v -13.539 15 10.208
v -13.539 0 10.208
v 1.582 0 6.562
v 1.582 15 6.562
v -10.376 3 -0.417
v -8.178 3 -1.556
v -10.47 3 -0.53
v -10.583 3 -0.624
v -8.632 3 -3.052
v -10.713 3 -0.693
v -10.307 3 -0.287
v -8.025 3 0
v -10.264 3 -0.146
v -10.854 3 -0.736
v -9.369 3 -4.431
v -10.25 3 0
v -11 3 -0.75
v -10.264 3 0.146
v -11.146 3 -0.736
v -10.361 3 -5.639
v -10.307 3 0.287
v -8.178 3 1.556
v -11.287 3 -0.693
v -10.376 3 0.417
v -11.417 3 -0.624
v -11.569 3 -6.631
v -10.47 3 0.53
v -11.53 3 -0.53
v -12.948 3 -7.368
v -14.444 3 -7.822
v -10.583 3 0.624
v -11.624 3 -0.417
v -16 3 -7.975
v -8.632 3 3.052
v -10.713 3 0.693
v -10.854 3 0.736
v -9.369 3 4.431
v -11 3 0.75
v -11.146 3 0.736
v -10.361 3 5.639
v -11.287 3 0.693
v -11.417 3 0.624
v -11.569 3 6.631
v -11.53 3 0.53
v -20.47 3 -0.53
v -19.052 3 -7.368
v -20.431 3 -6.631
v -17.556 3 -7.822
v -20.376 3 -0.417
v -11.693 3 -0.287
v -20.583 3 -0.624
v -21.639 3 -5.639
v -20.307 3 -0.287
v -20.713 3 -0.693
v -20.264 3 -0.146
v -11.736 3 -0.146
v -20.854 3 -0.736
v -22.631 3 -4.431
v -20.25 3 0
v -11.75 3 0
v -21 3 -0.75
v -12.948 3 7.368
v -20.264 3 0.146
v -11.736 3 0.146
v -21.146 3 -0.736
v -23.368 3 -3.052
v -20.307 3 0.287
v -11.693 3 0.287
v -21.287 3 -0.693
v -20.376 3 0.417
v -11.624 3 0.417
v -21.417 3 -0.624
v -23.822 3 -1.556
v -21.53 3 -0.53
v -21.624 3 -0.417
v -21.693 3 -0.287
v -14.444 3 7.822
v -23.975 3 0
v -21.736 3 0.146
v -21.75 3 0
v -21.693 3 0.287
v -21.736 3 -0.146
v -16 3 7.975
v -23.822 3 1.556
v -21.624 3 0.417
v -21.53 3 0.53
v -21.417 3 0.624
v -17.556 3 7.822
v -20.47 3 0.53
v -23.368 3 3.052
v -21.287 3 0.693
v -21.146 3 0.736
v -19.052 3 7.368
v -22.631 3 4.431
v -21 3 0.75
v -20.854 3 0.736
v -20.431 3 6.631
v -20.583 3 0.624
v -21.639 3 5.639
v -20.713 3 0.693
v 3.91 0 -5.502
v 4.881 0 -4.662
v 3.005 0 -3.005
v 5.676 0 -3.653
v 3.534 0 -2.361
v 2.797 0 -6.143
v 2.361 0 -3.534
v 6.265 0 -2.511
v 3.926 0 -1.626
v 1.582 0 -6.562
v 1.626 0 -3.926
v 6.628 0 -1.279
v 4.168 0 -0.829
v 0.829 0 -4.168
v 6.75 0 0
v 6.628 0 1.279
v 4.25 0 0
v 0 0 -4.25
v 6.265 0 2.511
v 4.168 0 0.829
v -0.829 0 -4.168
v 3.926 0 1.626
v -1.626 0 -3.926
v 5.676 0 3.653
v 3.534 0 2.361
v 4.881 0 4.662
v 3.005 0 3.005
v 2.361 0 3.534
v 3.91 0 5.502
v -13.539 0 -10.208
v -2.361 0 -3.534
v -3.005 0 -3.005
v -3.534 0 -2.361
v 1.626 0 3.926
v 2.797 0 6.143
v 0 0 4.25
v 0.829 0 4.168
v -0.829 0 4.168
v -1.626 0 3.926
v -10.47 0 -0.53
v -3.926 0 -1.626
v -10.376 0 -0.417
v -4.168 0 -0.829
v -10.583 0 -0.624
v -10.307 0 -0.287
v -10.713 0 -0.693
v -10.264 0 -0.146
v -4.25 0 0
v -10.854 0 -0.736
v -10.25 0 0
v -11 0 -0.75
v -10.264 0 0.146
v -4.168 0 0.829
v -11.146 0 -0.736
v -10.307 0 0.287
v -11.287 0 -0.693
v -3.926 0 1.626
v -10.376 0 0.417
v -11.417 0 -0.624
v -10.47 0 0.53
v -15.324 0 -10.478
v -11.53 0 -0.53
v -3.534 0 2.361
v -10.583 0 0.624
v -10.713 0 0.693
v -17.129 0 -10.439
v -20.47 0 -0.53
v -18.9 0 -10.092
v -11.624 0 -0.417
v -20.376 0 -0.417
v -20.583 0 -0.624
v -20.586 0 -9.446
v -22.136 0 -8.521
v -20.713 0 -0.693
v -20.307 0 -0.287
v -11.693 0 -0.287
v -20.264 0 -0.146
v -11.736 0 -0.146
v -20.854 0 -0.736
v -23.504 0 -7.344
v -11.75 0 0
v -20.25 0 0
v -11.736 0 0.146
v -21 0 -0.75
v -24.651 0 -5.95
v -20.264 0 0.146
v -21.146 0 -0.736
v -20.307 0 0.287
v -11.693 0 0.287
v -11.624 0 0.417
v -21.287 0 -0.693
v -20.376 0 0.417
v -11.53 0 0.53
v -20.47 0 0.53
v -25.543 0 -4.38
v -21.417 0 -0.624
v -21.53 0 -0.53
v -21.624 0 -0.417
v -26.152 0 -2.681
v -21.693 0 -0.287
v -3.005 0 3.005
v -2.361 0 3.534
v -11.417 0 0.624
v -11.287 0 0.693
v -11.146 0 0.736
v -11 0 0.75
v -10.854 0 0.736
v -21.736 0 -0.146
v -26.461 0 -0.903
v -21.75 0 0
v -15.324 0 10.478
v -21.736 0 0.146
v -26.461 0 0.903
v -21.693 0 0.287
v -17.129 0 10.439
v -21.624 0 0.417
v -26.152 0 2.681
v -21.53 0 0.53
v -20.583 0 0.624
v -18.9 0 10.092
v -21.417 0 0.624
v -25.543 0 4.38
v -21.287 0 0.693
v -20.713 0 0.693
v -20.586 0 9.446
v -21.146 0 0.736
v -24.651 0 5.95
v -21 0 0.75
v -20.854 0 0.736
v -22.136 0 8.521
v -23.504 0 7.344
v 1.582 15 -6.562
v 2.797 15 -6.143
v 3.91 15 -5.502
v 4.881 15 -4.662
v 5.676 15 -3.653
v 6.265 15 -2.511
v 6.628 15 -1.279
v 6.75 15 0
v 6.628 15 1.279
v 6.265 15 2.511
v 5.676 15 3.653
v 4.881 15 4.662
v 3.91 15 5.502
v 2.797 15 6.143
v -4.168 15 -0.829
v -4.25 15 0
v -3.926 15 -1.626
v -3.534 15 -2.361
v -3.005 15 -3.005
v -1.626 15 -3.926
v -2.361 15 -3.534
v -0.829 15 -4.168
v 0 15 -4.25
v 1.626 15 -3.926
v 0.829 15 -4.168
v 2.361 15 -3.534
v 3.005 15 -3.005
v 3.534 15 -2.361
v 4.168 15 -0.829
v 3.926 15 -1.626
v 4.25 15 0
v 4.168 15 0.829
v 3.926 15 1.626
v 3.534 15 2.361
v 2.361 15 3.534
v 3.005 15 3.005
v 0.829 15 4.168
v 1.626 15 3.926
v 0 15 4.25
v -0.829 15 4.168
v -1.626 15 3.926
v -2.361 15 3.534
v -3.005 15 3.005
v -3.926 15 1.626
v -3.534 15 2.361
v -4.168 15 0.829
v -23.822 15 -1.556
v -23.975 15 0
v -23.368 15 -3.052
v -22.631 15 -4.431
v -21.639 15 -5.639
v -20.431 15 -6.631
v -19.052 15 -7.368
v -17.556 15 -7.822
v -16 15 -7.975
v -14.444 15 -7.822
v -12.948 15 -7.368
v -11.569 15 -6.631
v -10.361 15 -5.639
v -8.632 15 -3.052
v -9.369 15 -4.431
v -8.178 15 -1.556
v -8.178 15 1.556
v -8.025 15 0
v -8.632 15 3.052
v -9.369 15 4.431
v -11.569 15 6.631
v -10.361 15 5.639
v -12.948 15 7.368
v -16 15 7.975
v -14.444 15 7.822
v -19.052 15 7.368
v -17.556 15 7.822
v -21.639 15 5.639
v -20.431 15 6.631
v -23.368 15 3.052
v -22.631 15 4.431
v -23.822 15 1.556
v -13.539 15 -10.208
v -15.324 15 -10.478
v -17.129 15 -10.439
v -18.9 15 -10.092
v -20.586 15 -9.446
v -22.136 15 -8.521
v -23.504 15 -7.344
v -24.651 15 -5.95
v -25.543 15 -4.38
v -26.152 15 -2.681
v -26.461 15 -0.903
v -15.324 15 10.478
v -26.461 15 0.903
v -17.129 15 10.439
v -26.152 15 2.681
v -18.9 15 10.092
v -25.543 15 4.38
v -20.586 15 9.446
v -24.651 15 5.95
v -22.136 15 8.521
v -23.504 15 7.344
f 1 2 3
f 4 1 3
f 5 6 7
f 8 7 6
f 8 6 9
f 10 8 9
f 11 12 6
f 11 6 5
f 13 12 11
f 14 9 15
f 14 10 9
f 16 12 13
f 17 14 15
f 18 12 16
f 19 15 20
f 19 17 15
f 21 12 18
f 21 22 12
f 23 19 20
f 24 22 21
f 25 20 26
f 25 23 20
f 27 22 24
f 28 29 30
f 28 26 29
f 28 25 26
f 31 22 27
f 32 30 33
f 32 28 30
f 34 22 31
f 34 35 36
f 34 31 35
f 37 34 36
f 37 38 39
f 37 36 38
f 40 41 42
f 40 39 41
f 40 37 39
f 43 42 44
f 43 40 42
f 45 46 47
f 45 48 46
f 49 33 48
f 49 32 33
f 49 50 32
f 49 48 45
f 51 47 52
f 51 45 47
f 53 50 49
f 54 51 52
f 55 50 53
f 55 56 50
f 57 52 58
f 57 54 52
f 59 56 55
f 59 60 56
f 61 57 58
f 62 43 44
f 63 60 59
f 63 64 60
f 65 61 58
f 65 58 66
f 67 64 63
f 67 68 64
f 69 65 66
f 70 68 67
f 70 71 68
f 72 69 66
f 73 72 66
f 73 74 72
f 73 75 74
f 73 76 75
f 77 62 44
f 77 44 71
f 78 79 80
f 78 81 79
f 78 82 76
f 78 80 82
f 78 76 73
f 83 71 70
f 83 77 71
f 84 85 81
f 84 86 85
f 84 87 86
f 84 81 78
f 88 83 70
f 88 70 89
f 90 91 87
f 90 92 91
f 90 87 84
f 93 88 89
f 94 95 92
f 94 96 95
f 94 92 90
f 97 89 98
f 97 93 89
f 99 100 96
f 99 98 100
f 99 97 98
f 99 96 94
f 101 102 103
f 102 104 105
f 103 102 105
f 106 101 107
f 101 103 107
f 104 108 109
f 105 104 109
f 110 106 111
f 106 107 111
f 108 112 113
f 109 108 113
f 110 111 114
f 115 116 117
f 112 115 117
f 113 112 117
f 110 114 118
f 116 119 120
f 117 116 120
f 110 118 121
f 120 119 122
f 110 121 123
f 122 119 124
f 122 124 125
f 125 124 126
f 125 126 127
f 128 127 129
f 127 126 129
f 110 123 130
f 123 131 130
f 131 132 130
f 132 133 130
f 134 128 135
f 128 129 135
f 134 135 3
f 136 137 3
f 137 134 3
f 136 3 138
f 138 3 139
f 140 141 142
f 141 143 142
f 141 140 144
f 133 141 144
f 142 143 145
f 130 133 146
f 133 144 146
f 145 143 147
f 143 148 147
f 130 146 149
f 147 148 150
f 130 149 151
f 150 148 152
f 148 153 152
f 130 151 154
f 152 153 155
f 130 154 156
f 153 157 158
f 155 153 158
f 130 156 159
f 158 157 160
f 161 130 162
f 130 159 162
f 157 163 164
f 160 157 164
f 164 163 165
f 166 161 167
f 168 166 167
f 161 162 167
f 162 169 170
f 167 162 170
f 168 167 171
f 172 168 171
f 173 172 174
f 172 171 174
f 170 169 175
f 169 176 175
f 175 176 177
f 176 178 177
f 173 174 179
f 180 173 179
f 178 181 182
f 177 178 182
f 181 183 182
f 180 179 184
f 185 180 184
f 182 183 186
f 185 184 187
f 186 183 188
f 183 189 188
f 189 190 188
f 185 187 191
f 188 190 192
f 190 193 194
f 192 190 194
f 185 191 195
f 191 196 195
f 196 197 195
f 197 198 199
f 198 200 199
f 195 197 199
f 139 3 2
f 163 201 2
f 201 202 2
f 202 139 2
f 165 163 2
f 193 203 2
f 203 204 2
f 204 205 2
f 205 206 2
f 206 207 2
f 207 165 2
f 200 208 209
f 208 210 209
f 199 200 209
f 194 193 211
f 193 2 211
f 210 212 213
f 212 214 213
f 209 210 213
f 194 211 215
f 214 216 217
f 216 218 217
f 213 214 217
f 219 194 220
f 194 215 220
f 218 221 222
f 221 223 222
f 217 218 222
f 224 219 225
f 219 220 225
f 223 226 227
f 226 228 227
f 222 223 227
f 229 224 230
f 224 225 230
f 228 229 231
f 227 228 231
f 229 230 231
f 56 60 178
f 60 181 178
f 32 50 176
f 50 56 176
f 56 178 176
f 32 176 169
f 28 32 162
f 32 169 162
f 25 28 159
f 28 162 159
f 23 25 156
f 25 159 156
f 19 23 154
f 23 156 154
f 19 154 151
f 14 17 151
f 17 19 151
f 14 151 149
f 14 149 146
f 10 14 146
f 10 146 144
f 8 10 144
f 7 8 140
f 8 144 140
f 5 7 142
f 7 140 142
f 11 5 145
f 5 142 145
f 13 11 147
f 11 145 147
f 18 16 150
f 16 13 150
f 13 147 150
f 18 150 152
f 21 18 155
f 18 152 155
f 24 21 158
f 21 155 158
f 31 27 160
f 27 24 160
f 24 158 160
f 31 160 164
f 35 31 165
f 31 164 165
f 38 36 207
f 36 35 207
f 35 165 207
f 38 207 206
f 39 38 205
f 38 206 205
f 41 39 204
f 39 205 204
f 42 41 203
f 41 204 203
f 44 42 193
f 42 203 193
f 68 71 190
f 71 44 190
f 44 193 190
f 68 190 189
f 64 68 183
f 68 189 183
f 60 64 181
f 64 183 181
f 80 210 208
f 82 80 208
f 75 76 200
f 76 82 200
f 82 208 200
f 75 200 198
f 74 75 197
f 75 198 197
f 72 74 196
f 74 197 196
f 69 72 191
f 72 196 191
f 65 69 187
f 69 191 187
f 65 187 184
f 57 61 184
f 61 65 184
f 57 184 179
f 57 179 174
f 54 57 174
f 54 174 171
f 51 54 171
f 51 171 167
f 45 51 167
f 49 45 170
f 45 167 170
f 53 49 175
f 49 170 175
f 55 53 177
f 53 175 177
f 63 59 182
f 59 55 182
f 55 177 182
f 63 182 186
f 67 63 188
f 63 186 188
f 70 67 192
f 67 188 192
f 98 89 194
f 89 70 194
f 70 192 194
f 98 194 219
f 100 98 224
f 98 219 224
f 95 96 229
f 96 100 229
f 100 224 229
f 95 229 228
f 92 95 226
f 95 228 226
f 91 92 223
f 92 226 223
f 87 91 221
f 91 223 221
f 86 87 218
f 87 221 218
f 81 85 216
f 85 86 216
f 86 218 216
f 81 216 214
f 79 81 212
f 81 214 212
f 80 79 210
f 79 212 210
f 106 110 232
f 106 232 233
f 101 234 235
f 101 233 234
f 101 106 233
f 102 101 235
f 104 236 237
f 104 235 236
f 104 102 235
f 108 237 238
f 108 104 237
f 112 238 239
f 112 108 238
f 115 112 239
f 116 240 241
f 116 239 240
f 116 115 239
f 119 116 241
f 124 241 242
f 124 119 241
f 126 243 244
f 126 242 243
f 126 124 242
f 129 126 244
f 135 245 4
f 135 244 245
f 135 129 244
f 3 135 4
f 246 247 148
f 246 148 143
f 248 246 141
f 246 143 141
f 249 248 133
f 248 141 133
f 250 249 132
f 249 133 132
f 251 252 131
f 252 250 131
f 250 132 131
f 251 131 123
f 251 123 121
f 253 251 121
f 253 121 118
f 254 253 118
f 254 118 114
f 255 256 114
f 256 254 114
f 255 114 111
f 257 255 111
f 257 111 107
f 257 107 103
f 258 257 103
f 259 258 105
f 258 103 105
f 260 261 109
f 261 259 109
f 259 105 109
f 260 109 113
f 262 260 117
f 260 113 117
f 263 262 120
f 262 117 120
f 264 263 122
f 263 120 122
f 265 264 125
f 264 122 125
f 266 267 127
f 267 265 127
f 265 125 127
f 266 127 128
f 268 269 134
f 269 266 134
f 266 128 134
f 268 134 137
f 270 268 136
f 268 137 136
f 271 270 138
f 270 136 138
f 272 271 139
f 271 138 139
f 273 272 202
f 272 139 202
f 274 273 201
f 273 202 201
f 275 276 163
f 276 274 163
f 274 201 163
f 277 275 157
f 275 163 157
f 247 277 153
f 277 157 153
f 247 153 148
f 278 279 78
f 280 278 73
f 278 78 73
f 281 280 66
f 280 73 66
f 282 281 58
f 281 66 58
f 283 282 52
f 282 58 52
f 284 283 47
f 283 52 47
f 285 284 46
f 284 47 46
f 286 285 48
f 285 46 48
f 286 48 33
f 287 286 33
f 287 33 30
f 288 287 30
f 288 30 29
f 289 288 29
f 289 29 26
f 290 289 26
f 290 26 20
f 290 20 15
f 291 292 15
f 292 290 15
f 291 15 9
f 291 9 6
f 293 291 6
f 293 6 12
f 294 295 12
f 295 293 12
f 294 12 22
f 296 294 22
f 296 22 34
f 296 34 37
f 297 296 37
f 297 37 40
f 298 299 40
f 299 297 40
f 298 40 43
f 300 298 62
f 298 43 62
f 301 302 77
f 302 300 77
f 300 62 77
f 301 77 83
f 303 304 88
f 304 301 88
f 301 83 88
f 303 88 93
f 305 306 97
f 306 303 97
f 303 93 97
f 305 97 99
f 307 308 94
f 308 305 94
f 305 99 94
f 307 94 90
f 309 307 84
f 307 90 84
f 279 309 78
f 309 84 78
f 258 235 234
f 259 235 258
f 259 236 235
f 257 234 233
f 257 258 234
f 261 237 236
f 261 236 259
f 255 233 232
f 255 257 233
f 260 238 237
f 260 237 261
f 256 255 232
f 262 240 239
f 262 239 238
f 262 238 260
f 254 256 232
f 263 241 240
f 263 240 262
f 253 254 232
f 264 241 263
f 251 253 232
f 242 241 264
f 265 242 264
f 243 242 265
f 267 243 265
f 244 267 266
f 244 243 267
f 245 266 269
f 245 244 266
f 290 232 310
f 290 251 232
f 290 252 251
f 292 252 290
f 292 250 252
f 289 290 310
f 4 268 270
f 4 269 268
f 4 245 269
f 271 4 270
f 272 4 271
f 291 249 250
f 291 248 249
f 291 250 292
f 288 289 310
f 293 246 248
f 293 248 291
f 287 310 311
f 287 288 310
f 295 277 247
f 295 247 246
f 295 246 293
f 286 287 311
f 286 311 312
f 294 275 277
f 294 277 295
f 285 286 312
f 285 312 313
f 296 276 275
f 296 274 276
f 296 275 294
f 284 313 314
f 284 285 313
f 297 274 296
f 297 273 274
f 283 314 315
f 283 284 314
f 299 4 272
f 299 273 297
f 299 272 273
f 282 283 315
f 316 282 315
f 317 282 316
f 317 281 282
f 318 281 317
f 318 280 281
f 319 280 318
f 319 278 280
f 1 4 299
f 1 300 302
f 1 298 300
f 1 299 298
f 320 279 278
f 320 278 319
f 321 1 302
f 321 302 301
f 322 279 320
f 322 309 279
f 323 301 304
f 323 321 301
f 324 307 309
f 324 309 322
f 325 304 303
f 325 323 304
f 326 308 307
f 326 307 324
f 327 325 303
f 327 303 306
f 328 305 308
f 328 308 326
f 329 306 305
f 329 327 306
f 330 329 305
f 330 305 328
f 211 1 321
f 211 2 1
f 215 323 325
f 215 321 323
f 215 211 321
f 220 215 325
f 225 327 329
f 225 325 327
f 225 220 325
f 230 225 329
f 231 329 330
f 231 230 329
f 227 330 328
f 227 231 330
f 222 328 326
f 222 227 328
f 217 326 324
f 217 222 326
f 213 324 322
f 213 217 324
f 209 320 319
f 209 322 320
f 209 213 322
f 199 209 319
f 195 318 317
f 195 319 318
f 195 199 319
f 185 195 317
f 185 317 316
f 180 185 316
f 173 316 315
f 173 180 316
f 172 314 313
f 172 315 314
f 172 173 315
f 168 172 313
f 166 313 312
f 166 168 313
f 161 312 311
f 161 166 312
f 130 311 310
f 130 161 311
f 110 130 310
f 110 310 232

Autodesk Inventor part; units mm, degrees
ref_plane "YZ Plane" through (0, 0, 0) normal (1, 0, 0) x (0, 1, 0)
ref_plane "XZ Plane" through (0, 0, 0) normal (0, 1, 0) x (-1, 0, 0)
ref_plane "XY Plane" through (0, 0, 0) normal (0, 0, 1) x (1, 0, 0)
sketch "Sketch1" plane through (0, 0, 0) normal (0, 1, 0) x (-1, 0, 0)
  line L0 (0, -14.7) -> (0, 14.7) construction
  line L1 (-13.4, 0) -> (33.15, 0) construction
  circle A0 centre (0, 0) radius 4.25
  circle A1 centre (16, 0) radius 7.975
  arc A2 (13.5391, -10.2075) -> (13.5391, 10.2075) centre (16, 0) ccw
  arc A3 (-1.582, 6.562) -> (-1.582, -6.562) centre (0, 0) ccw
  line L2 (13.5391, 10.2075) -> (-1.582, 6.562)
  line L3 (13.5391, -10.2075) -> (-1.582, -6.562)
  circle A4 centre (21, 0) radius 0.75
  circle A5 centre (11, 0) radius 0.75
  line L4 (16, 7.975) -> (16, -7.975) construction
  dimension "d0" = 8.5
  dimension "d1" = 15.95
  dimension "d2" = 16
  dimension "d3" = 21
  dimension "d4" = 13.5
  dimension "d5" = 1.5
  dimension "d6" = 1.5
  dimension "d7" = 10
extrude "Base" add sketch "Sketch1" along normal blind 3 contours A1 | L3 A3 L2 A2
extrude "Walls" add sketch "Sketch1" along normal blind 15 contours L3 A3 L2 A2
equation "\"d6\" = d5"
properties part number "transducer_holder" material "PC/ABS Plastic"
